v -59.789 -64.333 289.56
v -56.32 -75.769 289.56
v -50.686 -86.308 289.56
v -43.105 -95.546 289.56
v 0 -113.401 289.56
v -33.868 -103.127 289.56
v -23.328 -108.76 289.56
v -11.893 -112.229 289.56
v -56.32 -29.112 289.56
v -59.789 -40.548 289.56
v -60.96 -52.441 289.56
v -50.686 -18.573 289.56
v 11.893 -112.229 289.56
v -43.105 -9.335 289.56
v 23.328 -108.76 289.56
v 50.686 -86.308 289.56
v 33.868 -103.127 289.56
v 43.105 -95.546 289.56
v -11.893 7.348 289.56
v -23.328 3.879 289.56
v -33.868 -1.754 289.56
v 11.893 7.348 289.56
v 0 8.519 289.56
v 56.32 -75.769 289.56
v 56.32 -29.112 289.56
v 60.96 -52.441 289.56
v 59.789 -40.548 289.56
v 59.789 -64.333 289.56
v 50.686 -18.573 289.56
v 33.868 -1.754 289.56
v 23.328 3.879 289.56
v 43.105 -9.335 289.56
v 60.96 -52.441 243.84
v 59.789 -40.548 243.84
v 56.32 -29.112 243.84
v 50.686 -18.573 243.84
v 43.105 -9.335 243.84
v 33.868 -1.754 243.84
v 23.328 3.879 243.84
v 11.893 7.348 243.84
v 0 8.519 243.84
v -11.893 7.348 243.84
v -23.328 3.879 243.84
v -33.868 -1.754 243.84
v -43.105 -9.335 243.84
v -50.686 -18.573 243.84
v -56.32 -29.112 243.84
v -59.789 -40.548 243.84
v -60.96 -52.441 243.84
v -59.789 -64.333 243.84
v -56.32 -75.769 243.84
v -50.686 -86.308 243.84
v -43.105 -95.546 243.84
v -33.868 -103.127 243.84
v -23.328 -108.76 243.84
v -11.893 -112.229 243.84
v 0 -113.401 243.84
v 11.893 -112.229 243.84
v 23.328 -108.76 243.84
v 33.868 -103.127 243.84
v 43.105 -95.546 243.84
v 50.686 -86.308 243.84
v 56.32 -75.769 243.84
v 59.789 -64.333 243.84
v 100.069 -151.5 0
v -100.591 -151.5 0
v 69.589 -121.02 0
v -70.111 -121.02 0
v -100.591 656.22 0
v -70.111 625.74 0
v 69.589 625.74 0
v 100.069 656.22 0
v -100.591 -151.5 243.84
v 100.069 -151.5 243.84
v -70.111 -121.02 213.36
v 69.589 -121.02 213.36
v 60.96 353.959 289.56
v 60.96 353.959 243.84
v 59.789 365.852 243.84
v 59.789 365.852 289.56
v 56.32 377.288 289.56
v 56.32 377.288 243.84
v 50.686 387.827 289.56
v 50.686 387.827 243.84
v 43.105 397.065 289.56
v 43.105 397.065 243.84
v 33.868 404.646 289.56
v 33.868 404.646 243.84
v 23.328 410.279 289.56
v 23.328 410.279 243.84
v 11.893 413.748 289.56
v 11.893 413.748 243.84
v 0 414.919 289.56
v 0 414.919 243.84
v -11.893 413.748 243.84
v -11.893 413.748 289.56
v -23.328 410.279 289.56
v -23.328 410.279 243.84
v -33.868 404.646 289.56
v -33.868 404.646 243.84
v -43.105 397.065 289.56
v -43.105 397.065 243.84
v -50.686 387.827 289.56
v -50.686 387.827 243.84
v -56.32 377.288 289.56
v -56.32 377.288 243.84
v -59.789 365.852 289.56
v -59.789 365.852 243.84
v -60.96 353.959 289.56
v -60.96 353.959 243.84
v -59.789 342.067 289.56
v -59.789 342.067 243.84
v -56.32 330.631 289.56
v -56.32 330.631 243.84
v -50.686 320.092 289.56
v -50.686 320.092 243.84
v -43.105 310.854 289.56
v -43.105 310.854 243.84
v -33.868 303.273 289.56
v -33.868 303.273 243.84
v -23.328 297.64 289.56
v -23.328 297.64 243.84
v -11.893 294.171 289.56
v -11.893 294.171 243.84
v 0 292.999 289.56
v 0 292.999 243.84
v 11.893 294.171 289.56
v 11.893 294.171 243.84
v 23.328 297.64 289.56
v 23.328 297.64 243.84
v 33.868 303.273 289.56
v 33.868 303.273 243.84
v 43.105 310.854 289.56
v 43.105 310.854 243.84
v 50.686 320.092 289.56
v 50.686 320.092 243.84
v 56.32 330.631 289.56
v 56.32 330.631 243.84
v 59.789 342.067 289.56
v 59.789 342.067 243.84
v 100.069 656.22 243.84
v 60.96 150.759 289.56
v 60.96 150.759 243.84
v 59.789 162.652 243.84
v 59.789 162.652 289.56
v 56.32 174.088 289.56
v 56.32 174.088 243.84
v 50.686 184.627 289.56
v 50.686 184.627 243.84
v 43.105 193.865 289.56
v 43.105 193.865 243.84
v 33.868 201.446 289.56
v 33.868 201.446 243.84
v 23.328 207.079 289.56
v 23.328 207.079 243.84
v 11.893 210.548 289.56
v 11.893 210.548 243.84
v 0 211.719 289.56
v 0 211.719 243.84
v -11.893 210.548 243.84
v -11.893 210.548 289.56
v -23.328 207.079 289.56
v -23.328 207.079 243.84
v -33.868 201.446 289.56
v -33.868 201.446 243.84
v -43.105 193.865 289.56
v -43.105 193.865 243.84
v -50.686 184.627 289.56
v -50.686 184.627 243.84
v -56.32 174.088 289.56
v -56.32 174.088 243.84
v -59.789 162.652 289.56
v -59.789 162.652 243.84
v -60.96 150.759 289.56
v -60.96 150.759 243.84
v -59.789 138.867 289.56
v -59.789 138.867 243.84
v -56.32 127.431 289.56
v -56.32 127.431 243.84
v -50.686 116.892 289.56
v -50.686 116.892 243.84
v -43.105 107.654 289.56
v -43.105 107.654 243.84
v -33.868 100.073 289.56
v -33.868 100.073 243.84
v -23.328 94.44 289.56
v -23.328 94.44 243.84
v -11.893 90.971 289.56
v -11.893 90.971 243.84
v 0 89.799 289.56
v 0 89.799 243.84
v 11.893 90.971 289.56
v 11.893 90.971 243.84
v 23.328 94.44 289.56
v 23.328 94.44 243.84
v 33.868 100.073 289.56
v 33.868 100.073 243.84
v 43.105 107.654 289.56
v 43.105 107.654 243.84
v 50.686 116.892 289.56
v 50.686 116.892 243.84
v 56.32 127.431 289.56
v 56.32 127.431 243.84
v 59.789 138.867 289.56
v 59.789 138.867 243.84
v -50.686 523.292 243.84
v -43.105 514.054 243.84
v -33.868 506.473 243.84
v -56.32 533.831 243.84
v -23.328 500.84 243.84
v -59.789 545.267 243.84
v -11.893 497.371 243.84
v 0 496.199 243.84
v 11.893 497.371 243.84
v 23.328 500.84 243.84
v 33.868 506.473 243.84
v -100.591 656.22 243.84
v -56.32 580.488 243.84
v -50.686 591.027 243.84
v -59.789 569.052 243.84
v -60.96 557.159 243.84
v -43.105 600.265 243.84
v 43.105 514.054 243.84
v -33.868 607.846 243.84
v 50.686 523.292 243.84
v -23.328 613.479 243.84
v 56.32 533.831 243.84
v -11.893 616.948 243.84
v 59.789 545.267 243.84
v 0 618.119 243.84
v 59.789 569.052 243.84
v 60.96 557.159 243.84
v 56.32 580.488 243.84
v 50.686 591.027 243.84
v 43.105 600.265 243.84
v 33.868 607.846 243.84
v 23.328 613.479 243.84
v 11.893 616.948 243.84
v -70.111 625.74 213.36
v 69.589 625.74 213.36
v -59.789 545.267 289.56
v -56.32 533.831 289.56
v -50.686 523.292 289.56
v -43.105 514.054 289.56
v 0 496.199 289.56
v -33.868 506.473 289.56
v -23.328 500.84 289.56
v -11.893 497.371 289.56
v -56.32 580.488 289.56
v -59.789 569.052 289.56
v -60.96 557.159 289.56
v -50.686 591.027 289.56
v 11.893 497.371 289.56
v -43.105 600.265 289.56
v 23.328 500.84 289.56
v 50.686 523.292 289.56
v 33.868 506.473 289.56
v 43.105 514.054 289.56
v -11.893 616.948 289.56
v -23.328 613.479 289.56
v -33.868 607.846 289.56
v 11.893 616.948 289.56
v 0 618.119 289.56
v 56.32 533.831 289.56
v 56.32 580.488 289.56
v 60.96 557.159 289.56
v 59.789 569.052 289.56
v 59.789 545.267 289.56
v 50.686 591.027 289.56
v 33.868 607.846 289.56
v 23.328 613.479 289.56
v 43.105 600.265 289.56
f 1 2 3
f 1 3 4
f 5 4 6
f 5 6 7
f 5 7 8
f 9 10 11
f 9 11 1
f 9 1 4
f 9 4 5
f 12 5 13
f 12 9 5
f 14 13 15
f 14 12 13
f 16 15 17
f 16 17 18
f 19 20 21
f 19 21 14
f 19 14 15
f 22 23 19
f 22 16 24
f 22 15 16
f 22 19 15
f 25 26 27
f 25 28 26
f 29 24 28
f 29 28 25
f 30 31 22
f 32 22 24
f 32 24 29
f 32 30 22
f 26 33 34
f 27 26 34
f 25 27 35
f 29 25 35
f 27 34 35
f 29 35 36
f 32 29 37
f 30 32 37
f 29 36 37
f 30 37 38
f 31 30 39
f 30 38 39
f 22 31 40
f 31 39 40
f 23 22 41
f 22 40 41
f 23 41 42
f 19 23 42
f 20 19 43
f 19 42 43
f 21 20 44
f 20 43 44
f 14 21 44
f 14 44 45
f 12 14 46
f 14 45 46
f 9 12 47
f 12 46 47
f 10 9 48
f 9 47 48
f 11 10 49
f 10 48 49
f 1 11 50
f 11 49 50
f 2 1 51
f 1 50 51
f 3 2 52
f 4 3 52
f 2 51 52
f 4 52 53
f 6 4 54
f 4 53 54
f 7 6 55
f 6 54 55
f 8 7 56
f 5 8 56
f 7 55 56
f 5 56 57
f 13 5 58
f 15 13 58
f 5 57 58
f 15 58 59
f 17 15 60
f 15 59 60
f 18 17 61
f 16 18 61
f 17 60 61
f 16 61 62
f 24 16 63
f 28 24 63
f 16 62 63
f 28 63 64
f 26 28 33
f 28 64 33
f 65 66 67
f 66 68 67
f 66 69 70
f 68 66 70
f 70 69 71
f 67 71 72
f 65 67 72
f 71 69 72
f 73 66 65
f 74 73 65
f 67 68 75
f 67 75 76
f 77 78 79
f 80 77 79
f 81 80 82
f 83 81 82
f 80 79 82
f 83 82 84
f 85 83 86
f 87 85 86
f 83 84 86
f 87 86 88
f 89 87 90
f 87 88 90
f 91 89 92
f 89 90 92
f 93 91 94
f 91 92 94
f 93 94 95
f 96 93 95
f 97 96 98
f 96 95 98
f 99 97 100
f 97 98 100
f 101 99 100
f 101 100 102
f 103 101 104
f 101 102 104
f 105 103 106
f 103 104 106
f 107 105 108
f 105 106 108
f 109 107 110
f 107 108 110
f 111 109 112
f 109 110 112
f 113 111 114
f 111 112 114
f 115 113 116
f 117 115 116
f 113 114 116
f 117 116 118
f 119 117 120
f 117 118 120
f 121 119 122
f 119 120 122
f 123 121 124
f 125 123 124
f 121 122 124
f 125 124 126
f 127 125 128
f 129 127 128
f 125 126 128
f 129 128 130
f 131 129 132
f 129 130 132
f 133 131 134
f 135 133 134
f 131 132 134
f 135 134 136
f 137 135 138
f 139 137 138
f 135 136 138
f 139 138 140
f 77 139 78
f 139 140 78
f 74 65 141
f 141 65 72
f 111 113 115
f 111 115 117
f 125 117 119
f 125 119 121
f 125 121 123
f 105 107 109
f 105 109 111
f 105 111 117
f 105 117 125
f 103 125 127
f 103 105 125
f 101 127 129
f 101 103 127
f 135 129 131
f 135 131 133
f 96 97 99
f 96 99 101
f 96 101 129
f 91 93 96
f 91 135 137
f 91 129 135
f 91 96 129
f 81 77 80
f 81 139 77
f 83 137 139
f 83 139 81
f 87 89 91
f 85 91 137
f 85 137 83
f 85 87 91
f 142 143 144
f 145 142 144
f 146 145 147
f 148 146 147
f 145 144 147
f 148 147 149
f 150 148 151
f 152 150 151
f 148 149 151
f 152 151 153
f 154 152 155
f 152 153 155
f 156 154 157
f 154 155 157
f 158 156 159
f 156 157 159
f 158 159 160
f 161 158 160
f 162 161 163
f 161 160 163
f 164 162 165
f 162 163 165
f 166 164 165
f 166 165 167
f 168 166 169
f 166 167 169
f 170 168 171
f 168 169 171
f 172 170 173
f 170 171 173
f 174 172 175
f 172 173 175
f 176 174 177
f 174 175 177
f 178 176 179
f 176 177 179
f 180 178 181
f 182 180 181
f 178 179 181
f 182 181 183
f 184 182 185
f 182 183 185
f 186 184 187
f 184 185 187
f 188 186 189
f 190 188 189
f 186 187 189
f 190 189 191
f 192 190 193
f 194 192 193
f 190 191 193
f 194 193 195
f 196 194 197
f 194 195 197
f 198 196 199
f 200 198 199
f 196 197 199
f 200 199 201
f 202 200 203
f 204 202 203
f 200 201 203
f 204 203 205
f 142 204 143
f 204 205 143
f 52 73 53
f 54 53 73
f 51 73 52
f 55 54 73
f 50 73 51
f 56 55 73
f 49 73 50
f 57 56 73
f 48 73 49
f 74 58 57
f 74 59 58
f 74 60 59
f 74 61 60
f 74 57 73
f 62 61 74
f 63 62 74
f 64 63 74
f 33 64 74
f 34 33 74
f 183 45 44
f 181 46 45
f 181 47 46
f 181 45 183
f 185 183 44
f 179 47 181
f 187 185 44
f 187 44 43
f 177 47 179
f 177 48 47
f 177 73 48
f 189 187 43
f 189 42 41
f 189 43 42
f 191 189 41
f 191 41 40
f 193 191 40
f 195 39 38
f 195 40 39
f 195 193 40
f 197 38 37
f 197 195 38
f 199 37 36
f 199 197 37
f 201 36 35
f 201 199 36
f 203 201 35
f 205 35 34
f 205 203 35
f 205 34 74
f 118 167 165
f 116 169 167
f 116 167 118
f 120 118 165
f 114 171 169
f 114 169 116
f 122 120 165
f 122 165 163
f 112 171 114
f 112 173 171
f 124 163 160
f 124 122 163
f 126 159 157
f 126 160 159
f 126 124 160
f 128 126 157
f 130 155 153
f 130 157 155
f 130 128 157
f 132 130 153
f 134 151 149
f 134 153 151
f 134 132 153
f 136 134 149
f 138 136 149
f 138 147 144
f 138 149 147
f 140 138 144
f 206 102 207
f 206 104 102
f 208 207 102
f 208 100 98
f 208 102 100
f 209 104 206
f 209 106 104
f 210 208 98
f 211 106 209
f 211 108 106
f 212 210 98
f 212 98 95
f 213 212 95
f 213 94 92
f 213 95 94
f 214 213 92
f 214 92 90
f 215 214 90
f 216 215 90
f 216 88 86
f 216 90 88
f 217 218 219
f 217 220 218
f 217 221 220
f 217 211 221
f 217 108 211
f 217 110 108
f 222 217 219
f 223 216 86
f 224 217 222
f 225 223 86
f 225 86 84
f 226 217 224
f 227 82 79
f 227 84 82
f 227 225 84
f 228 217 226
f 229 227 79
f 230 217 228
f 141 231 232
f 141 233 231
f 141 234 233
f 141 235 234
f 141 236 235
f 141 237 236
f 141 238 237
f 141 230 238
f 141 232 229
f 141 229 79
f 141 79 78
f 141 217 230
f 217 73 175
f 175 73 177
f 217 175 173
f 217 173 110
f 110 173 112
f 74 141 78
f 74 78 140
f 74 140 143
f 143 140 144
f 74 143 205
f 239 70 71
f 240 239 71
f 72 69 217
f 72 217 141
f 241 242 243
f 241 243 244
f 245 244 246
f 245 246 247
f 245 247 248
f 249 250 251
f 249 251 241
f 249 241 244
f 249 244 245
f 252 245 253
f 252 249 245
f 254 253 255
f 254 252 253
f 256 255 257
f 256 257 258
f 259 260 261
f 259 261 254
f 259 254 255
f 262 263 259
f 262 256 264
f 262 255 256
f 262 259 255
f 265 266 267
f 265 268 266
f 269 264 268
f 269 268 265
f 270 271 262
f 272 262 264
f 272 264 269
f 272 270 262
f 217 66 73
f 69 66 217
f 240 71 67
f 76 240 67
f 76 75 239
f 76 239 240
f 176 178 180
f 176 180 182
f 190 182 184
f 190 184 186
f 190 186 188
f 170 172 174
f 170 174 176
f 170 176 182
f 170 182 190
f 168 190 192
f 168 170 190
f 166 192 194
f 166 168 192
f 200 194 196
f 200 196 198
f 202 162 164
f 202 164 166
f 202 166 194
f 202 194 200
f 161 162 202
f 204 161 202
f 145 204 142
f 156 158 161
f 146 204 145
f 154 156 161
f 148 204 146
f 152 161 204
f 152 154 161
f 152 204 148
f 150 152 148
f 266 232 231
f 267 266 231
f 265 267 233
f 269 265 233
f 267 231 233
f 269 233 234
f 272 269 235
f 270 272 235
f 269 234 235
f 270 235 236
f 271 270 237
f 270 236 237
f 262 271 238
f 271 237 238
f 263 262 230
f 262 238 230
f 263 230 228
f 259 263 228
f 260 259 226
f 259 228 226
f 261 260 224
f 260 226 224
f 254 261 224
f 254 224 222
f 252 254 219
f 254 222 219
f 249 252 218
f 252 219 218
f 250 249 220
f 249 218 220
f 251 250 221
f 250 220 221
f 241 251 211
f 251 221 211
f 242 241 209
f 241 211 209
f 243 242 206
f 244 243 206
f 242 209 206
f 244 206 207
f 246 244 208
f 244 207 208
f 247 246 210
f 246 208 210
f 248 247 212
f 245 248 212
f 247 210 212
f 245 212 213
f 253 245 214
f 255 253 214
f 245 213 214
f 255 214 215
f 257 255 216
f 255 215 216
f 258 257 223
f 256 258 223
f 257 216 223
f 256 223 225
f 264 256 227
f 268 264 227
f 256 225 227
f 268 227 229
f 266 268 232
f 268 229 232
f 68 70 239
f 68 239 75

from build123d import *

# Parameters (mm, degrees)
F0_W     = 200.66
F0_H     = 807.72
F1_DEPTH = 243.84
F2_R     = 60.96
F3_DEPTH = 45.72
F4_W     = 139.7
F4_H     = 746.76
F5_DEPTH = 213.36


with BuildPart() as f1:
    # F0 (on Top) → F1 (new body)
    with BuildSketch(Plane.XY):
        with Locations((-0.261474, 252.359729)):
            Rectangle(F0_W, F0_H)
    extrude(amount=F1_DEPTH)

    # F2 (on face) → F3 (join)
    with BuildSketch(Plane.XY.offset(243.84)):
        with Locations((0, -52.440616)):
            Circle(F2_R)
        with Locations((0, 150.759384)):
            Circle(F2_R)
        with Locations((0, 353.959384)):
            Circle(F2_R)
        with Locations((0, 557.159384)):
            Circle(F2_R)
    extrude(amount=F3_DEPTH)

    # F4 (on face) → F5 (cut)
    with BuildSketch(Plane(origin=(0, 0, 0), x_dir=(1, 0, 0), z_dir=(0, 0, -1))):
        with Locations((-0.261474, -252.359729)):
            Rectangle(F4_W, F4_H)
    extrude(amount=-F5_DEPTH, mode=Mode.SUBTRACT)


solid = f1.part
